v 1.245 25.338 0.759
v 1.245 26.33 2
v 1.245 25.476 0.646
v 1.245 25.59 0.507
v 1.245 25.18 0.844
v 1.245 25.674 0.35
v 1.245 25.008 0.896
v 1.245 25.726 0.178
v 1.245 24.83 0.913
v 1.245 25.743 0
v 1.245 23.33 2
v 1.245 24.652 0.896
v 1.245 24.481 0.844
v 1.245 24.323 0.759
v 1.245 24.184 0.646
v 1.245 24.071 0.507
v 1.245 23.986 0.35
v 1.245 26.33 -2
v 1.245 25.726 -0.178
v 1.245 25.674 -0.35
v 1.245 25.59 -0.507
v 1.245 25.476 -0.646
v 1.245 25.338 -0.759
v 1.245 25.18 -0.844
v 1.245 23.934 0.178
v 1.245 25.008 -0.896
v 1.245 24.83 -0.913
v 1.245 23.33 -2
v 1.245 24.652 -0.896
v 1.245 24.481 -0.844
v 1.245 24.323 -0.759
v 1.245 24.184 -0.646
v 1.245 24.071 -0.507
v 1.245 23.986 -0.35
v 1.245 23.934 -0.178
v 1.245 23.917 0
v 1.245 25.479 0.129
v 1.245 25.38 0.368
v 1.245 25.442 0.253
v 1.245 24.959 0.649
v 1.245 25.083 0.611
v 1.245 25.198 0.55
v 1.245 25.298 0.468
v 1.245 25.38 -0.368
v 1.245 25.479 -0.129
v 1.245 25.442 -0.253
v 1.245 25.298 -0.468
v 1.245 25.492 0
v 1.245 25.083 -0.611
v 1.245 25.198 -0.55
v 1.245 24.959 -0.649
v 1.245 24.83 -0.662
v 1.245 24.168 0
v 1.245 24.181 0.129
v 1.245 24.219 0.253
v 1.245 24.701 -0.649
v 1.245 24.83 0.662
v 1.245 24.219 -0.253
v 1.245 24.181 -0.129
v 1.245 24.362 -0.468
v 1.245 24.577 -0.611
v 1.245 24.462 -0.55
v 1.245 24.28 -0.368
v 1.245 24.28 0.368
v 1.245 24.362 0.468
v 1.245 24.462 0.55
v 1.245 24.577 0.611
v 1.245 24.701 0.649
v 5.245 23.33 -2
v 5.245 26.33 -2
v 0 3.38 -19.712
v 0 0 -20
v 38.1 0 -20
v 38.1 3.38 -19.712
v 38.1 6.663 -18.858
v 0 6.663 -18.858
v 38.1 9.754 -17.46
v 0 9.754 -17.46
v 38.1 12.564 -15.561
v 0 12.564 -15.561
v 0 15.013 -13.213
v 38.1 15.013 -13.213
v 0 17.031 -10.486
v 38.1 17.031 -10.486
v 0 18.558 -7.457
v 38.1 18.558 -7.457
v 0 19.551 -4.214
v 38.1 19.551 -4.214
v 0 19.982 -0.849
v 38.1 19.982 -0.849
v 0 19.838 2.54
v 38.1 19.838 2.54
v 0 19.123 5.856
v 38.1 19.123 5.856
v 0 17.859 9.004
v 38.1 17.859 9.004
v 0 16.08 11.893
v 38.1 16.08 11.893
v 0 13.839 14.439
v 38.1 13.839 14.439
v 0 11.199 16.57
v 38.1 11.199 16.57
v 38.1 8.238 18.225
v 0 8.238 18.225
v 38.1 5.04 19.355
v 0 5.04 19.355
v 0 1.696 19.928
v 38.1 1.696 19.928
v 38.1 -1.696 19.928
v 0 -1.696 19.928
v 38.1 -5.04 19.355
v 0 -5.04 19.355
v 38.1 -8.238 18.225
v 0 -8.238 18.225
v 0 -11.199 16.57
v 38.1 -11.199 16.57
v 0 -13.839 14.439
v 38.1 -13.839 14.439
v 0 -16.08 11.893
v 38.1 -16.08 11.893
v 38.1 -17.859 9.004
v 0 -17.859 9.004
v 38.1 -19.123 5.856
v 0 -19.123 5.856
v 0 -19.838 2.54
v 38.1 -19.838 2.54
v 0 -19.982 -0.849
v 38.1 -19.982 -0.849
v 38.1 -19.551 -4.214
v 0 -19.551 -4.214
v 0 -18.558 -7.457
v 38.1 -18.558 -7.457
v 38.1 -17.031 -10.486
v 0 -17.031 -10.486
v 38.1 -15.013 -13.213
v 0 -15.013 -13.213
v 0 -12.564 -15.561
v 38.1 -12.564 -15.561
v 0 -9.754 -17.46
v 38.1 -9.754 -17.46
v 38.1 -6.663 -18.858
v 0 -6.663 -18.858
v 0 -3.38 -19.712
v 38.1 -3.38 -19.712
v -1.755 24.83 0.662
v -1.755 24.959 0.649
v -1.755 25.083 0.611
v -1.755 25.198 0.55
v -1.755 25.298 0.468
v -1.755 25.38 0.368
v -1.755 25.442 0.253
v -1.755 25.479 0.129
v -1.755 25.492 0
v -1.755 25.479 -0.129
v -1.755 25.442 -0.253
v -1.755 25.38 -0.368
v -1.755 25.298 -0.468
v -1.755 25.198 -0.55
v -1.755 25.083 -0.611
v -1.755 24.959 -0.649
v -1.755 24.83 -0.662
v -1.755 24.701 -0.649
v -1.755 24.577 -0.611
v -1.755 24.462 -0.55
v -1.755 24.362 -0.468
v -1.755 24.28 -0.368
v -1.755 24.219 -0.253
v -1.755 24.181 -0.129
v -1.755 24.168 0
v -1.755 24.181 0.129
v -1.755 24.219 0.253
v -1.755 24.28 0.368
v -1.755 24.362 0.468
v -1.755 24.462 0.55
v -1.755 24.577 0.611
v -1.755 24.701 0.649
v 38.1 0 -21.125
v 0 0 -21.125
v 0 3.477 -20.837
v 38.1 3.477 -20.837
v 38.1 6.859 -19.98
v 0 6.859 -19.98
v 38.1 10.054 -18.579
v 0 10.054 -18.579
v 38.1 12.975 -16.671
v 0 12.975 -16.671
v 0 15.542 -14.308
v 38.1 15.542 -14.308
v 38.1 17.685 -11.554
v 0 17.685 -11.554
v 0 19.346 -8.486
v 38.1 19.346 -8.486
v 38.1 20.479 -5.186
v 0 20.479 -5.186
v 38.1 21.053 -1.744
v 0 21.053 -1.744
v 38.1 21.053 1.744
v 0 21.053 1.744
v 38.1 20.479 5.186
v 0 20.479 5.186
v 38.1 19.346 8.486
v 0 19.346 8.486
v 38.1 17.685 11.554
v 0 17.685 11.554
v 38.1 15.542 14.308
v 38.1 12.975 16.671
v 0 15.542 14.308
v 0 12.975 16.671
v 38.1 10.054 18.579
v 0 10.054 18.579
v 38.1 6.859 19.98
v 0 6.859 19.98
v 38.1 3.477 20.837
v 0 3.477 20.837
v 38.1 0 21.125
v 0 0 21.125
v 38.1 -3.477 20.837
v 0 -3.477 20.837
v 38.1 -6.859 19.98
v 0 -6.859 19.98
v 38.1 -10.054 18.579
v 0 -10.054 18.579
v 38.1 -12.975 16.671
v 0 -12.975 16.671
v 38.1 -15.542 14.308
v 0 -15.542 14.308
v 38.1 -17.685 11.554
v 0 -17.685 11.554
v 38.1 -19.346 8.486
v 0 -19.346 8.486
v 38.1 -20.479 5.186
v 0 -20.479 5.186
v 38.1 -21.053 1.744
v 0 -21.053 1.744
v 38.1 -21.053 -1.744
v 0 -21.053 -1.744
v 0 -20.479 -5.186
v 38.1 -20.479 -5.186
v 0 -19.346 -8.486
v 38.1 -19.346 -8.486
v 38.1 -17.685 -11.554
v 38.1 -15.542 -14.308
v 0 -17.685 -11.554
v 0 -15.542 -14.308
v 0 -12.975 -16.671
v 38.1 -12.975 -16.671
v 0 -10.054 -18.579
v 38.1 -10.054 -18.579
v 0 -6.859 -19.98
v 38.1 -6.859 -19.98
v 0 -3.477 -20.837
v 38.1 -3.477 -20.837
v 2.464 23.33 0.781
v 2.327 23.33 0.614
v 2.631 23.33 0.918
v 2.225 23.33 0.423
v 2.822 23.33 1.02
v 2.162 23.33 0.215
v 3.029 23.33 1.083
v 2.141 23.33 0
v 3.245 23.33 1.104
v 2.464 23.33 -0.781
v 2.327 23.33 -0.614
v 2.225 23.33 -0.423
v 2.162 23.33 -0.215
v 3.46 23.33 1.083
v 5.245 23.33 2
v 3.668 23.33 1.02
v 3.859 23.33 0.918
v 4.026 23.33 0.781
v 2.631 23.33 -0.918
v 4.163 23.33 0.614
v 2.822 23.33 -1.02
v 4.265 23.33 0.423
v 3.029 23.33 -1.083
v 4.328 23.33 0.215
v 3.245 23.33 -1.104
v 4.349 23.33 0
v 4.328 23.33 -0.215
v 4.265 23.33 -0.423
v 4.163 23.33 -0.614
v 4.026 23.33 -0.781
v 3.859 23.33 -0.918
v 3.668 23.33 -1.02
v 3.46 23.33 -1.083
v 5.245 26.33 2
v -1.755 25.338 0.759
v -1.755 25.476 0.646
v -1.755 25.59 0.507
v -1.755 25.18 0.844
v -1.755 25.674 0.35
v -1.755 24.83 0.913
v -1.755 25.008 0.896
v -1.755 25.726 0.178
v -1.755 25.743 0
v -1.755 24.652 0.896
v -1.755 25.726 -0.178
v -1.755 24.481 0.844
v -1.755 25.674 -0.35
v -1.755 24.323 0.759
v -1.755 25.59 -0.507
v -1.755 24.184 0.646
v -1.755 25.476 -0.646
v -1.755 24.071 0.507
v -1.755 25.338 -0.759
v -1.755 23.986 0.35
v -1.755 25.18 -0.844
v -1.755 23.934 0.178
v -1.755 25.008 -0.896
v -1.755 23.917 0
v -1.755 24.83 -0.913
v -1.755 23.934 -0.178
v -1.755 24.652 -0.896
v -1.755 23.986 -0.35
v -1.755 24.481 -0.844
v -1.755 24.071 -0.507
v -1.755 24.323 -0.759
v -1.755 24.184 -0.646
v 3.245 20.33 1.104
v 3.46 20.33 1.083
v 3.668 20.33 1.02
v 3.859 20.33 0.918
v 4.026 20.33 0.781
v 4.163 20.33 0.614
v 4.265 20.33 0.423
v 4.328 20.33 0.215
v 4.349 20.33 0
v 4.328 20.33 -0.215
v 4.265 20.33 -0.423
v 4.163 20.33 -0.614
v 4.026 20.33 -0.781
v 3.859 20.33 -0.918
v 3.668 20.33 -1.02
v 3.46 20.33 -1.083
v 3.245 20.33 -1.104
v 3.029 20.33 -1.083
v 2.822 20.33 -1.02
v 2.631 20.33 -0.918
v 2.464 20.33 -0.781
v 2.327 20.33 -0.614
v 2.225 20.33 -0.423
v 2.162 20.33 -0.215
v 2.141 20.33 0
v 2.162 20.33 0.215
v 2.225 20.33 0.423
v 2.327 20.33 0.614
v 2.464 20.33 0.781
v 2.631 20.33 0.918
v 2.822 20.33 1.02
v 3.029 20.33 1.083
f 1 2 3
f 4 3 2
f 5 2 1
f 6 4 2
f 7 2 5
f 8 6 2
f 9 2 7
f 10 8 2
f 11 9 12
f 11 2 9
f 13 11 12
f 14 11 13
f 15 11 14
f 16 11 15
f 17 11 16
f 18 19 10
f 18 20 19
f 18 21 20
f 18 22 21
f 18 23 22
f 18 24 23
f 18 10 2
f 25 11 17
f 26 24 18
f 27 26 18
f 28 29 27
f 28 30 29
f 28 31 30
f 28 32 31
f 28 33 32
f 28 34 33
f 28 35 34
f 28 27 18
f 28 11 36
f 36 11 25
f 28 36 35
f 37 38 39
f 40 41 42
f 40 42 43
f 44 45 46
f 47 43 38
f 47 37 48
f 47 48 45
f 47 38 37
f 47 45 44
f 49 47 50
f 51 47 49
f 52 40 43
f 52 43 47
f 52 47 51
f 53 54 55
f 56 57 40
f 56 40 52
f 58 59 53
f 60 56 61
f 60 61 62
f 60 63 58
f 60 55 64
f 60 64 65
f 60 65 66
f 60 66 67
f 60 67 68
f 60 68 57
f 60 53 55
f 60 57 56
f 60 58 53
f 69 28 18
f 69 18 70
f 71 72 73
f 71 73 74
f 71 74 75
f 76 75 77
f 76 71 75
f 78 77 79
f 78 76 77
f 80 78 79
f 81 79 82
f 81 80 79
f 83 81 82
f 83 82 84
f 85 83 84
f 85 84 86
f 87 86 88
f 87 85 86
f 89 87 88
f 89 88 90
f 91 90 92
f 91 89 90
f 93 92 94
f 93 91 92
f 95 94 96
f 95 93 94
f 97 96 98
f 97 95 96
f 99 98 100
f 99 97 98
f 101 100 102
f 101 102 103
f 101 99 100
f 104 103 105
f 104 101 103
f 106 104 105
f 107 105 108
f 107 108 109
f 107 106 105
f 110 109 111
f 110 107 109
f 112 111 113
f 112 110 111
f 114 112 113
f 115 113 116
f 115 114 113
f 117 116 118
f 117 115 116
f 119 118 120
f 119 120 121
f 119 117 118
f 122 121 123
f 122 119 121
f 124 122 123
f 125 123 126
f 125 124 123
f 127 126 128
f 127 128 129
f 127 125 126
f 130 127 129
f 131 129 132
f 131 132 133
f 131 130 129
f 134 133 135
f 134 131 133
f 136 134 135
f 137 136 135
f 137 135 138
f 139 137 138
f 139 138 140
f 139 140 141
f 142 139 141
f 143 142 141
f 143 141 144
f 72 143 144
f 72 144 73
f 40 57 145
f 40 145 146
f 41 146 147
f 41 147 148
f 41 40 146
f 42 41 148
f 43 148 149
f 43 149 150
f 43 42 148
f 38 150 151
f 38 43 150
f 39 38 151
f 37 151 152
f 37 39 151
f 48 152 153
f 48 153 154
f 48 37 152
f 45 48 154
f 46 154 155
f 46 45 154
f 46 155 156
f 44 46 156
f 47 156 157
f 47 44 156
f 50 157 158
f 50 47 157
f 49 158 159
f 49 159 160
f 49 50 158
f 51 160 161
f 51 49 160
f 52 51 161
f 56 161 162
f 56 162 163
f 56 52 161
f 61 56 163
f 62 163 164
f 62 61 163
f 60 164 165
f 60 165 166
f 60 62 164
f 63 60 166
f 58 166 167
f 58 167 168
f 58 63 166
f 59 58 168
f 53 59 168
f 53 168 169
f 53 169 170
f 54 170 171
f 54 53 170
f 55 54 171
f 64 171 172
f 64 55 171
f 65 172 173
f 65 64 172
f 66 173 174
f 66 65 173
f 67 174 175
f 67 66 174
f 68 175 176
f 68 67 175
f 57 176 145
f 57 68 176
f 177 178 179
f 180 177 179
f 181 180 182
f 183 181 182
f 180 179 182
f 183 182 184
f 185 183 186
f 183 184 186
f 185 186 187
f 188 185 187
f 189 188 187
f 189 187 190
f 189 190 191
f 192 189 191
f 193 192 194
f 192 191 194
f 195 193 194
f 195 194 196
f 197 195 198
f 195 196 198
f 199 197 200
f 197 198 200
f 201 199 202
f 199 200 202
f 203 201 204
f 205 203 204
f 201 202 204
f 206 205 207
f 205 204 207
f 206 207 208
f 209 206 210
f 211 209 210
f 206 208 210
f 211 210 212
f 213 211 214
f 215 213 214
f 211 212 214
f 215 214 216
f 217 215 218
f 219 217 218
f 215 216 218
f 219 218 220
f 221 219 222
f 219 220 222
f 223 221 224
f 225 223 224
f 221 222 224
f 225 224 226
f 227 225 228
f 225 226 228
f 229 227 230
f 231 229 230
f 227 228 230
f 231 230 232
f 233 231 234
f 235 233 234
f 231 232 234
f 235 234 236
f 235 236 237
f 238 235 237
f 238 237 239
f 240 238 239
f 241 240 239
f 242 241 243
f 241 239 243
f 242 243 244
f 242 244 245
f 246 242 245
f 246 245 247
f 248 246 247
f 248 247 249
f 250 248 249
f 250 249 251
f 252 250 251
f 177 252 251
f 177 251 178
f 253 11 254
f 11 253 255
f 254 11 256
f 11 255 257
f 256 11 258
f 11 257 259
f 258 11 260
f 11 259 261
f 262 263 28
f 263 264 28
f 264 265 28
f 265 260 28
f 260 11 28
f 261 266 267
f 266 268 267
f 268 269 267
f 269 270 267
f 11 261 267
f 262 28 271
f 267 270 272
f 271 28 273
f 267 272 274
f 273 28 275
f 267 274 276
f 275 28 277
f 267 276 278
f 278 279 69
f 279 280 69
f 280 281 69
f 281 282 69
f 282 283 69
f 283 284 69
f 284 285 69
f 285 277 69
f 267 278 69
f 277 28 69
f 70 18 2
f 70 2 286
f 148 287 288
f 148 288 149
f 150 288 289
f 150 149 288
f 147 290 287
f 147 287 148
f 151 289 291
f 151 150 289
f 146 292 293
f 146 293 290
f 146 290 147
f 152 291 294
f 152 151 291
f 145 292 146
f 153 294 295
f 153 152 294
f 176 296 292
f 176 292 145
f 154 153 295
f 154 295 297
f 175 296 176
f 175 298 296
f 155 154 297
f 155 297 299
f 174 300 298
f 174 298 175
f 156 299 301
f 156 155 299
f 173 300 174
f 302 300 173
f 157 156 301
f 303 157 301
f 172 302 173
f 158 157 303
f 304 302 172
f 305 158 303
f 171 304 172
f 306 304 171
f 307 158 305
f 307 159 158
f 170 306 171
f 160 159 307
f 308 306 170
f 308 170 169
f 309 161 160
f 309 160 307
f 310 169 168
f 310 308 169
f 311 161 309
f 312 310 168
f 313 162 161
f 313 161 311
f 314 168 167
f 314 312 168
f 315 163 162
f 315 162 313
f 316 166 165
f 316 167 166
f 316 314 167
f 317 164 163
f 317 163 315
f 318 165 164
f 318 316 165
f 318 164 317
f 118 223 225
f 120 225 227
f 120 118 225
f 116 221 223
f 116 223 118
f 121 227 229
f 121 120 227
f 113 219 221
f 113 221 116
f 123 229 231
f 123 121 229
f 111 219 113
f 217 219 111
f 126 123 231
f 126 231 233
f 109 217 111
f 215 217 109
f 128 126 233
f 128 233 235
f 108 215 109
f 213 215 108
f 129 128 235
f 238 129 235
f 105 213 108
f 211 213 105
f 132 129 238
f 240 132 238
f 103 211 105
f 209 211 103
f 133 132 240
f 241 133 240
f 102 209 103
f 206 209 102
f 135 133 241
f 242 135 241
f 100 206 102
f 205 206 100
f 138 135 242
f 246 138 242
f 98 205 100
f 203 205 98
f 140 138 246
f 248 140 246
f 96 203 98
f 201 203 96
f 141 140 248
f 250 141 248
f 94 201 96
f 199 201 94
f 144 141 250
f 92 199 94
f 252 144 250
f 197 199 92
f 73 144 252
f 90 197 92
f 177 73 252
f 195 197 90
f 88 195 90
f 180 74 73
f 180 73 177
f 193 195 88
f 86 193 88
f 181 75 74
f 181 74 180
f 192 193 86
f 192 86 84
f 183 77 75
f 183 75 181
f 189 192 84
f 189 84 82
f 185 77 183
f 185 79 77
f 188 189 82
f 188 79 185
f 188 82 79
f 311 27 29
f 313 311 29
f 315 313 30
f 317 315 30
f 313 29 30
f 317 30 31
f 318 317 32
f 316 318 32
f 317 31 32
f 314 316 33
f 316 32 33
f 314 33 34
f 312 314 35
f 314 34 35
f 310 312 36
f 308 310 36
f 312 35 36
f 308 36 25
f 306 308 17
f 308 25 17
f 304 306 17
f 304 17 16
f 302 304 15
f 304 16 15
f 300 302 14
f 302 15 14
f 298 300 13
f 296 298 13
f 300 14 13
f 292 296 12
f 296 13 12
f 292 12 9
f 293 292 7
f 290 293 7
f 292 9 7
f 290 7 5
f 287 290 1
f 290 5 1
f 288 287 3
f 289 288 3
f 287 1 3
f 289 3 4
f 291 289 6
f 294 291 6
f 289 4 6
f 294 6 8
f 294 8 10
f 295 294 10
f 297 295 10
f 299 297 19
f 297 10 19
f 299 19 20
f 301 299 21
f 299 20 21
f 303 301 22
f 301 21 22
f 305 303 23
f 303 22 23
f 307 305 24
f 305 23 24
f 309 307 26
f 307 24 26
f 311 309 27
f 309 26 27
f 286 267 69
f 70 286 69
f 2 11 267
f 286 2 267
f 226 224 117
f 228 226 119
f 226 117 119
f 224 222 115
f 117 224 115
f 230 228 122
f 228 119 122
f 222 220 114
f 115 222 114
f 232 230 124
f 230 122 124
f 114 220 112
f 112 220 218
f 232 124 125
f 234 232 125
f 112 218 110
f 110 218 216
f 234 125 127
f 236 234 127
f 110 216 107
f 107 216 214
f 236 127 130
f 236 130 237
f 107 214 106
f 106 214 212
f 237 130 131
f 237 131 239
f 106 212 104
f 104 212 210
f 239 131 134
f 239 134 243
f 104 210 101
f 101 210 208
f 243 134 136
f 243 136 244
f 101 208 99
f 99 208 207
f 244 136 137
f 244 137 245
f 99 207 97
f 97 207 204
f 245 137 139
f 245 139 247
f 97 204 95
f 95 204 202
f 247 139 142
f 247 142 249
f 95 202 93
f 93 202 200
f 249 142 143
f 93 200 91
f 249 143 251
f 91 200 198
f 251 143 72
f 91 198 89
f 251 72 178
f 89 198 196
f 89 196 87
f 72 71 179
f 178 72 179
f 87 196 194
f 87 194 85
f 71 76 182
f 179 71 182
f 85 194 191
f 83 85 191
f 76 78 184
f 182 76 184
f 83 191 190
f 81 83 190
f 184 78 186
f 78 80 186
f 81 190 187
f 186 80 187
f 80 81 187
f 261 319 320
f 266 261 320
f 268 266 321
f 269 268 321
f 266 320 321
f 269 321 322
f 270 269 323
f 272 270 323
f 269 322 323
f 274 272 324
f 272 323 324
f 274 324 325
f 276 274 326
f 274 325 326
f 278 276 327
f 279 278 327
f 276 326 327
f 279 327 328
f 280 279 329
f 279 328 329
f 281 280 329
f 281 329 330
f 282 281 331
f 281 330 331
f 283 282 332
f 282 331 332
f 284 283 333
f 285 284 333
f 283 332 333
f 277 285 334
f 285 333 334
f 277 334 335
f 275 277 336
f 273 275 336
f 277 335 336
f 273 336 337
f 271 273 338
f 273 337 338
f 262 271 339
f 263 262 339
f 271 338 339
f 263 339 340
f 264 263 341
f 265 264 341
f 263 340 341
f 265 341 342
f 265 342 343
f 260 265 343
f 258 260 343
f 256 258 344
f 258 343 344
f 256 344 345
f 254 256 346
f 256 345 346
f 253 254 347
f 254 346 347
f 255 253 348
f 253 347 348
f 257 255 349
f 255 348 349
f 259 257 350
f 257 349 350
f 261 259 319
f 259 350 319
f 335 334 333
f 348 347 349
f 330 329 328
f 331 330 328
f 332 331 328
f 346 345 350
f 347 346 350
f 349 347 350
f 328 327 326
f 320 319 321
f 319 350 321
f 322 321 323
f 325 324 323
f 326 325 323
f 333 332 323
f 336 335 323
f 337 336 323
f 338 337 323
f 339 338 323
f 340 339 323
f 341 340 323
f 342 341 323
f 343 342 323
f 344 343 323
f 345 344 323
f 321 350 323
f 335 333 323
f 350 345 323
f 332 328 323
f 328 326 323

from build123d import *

# Parameters (mm, degrees)
SKETCH1_R           = 21.125
SKETCH1_R_2         = 20
BOSS_EXTRUDE1_DEPTH = 38.1
SKETCH2_R           = 1.104412627
BOSS_EXTRUDE2_DEPTH = 3
SKETCH3_W           = 4
SKETCH3_H           = 4
BOSS_EXTRUDE3_DEPTH = 3
SKETCH4_R           = 0.913347132
SKETCH4_R_2         = 0.661870058
BOSS_EXTRUDE4_DEPTH = 3


with BuildPart() as part:
    # Sketch1 → Boss-Extrude1 (new body)
    with BuildSketch(Plane(origin=(0, 0, 0), x_dir=(0, 0, -1), z_dir=(1, 0, 0))):
        Circle(SKETCH1_R)
        Circle(SKETCH1_R_2, mode=Mode.SUBTRACT)
    extrude(amount=BOSS_EXTRUDE1_DEPTH)


with BuildPart() as body_2:
    # Sketch2 → Boss-Extrude2 (new body)
    with BuildSketch(Plane(origin=(0, 20.330096143, 0), x_dir=(1, 0, 0), z_dir=(0, 1, 0))):
        with Locations(Location((3.244933056, 0, 0), (0, 0, 270))):
            Circle(SKETCH2_R)
    extrude(amount=BOSS_EXTRUDE2_DEPTH)

    # Sketch3 → Boss-Extrude3 (add)
    with BuildSketch(Plane(origin=(0, 23.330096143, 0), x_dir=(1, 0, 0), z_dir=(0, 1, 0))):
        with Locations((3.244933056, 0)):
            Rectangle(SKETCH3_W, SKETCH3_H)
    extrude(amount=BOSS_EXTRUDE3_DEPTH)

    # Sketch4 → Boss-Extrude4 (add)
    with BuildSketch(Plane.ZY.offset(-1.244933056)):
        with Locations(Location((0, 24.83009614, 0), (0, 0, 180))):
            Circle(SKETCH4_R)
        with Locations((0, 24.83009614)):
            Circle(SKETCH4_R_2, mode=Mode.SUBTRACT)
    extrude(amount=BOSS_EXTRUDE4_DEPTH)


solid = Compound([part.part, body_2.part])
